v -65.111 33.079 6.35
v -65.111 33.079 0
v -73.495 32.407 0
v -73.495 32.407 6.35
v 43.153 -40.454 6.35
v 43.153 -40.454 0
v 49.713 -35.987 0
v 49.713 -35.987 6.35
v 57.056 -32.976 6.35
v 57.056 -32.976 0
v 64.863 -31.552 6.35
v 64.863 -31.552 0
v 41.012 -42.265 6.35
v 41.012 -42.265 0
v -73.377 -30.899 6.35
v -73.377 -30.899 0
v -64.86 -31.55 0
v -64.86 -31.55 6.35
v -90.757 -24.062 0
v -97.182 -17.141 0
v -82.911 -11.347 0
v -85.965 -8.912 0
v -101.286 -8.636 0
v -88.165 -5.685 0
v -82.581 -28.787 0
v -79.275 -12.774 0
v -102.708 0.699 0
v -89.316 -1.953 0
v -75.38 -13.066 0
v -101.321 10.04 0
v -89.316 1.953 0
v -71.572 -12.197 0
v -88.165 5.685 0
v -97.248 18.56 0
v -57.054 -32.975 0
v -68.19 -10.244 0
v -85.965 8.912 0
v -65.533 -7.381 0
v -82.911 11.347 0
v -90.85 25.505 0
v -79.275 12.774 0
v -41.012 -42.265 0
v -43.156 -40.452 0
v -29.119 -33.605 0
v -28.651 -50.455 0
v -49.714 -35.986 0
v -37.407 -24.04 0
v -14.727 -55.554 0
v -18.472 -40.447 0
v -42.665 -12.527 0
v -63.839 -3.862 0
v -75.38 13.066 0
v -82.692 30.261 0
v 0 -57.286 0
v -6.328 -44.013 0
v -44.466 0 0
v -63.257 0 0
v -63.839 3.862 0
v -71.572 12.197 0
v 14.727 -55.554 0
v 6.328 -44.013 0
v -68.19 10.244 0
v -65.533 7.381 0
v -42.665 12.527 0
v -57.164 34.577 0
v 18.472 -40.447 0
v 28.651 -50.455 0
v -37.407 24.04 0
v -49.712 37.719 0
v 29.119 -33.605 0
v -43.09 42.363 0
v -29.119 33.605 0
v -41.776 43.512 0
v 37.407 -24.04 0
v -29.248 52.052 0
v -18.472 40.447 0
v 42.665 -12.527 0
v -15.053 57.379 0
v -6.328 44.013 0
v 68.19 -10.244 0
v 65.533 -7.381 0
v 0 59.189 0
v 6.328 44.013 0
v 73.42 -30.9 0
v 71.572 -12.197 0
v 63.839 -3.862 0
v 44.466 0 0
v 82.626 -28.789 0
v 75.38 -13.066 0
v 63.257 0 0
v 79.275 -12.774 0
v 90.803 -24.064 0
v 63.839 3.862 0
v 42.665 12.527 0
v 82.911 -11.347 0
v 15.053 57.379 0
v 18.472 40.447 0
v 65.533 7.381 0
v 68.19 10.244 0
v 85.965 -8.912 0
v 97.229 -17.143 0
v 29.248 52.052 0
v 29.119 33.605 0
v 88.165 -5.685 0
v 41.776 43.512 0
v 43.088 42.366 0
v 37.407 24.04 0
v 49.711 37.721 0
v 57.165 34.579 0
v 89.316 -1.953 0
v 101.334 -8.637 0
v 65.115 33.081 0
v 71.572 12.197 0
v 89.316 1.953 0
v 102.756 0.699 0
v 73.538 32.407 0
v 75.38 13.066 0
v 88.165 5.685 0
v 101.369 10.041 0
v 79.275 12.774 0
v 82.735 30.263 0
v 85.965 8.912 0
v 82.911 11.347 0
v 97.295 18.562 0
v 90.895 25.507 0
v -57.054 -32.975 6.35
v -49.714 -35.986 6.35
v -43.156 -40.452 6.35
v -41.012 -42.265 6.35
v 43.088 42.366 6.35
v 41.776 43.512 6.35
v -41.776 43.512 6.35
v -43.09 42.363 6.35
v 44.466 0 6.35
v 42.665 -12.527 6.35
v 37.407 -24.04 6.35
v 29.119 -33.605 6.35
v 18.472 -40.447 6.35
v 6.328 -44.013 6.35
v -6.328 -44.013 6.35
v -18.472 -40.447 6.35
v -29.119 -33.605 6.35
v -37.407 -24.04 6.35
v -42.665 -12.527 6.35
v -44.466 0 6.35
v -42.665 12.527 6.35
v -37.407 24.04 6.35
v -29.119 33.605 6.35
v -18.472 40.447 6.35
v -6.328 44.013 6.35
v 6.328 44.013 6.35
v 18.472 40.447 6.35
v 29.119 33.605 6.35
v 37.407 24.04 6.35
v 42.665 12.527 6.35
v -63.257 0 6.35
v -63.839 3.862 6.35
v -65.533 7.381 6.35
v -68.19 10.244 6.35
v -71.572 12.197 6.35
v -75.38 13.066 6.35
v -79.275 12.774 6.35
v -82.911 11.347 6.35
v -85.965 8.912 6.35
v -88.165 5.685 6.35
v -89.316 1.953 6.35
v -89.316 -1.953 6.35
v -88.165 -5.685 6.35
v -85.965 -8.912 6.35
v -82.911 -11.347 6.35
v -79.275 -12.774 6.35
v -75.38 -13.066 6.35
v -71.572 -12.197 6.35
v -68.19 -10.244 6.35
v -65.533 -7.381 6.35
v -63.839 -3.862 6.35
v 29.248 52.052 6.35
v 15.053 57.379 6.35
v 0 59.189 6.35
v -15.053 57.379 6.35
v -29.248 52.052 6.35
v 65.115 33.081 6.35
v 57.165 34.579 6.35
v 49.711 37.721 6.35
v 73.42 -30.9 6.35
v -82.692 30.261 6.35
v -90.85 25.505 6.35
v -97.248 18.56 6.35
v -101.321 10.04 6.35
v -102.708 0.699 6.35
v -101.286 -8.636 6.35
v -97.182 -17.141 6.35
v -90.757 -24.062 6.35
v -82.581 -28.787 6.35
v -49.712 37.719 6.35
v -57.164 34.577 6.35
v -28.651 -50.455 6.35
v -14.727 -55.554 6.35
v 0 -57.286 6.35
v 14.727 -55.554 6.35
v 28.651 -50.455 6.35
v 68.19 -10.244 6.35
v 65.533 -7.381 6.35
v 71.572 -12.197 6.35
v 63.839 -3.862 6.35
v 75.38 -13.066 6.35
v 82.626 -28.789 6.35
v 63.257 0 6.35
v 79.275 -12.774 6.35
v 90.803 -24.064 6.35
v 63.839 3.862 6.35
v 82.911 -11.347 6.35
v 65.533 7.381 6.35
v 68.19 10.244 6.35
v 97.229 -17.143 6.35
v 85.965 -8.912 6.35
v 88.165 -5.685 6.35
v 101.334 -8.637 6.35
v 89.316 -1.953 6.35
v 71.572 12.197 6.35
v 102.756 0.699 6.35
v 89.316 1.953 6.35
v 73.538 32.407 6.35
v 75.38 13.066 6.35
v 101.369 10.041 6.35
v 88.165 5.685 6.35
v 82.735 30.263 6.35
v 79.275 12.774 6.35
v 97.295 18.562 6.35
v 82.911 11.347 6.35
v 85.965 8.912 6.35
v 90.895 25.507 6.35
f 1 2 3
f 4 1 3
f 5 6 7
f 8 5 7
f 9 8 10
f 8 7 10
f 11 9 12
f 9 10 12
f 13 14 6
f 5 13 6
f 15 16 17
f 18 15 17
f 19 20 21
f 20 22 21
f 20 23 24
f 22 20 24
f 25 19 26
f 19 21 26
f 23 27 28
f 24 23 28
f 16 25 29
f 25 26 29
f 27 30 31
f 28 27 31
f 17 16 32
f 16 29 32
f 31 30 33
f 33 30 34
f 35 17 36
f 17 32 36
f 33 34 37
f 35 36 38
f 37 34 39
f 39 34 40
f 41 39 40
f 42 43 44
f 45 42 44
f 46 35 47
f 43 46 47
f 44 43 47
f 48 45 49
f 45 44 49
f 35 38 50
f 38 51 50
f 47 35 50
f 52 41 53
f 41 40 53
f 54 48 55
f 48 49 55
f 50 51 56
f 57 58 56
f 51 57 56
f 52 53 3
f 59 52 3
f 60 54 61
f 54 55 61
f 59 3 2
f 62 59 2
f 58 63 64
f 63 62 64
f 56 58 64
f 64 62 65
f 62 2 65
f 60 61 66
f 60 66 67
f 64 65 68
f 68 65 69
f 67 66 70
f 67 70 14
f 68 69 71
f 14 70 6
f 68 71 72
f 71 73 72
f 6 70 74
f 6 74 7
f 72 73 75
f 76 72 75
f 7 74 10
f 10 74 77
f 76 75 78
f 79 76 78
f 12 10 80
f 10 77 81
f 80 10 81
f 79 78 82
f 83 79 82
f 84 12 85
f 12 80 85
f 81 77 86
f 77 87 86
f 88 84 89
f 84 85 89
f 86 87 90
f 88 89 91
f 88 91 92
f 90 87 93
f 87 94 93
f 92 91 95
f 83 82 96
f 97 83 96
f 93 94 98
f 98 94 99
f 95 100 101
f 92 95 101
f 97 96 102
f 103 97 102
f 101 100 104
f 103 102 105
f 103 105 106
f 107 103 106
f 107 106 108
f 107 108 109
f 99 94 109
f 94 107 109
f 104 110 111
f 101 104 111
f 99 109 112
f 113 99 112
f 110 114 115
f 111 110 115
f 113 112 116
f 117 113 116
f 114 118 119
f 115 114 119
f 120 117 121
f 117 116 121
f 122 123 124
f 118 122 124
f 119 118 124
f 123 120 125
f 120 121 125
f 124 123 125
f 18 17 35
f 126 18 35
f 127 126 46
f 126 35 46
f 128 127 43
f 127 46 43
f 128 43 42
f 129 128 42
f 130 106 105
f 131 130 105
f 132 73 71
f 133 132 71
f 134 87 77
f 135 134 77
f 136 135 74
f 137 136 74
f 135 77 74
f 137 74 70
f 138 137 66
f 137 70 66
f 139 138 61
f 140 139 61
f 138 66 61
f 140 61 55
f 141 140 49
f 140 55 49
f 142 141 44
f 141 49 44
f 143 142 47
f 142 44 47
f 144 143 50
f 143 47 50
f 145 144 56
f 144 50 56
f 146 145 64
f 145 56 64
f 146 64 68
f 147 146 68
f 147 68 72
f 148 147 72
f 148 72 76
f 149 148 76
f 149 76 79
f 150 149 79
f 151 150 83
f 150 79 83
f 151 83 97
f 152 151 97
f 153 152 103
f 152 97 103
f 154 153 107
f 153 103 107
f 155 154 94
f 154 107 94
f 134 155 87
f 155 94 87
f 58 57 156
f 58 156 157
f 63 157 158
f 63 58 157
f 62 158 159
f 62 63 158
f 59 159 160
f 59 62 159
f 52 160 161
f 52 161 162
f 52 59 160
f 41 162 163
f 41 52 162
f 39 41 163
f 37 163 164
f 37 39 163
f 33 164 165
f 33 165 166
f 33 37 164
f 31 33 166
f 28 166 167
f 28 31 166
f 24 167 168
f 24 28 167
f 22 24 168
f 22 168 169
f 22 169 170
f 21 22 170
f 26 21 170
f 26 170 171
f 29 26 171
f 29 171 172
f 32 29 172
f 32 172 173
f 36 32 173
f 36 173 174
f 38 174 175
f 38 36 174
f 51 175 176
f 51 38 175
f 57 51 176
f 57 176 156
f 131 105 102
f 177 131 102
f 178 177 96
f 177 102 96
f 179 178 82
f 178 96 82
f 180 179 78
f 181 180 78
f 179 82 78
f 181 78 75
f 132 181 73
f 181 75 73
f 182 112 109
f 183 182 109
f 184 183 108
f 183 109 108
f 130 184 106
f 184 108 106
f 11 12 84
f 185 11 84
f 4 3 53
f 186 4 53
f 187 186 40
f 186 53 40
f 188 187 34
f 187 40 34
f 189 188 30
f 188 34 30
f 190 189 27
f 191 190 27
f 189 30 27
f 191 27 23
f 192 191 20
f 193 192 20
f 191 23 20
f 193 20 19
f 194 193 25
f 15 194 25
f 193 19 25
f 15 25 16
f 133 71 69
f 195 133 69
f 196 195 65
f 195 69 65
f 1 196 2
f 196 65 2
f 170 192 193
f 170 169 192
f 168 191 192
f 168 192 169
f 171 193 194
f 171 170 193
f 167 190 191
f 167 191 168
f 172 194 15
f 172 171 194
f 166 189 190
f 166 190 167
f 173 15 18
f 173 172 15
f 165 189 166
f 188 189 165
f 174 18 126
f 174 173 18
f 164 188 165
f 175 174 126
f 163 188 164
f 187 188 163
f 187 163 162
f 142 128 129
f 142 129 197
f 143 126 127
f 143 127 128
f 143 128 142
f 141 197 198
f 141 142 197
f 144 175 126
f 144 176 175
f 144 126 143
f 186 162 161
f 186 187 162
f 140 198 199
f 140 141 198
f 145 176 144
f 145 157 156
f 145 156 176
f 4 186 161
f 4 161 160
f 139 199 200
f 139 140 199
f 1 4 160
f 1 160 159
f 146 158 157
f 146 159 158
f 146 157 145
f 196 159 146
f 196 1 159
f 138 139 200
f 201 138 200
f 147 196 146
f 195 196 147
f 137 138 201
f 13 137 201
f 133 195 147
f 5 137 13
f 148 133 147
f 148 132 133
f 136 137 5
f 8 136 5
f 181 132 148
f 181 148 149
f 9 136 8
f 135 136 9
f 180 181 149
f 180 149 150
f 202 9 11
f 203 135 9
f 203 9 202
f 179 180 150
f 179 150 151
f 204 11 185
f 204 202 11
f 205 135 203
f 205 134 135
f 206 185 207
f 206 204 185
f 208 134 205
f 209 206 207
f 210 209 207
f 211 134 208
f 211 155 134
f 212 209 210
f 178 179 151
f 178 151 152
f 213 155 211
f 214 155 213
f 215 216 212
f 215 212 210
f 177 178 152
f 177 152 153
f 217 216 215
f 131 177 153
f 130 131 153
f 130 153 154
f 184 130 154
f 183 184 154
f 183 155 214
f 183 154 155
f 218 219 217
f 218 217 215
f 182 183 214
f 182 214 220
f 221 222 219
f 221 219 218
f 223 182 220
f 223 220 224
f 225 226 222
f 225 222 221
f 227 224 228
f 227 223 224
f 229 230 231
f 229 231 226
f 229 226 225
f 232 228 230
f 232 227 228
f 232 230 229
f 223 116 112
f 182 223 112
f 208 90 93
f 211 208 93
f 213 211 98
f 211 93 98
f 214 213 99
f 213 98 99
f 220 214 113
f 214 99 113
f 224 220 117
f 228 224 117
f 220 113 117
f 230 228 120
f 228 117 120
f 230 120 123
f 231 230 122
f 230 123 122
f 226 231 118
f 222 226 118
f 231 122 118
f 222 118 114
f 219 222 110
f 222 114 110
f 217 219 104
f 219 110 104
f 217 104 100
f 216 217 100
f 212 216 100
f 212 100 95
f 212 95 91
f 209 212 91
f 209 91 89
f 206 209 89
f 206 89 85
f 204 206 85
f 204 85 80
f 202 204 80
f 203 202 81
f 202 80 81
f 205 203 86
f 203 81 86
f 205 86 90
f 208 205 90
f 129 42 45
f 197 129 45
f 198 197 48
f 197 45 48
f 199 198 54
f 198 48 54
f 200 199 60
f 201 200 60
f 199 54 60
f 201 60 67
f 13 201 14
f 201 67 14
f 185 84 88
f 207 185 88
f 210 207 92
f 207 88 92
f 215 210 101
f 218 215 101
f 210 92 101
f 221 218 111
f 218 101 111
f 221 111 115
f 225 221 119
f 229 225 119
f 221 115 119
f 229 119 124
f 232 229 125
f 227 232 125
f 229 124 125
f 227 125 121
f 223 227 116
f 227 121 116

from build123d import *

# Parameters (mm, degrees)
F0_R     = 13.102935
F1_DEPTH = 6.35


with BuildPart() as f1:
    # F0 (on Top) → F1 (new body)
    with BuildSketch(Plane.XY):
        with BuildLine():
            Line((-65.111071, 33.079109), (-73.495406, 32.406889))
            ThreePointArc((-73.495406, 32.406889), (-102.707914, 0.699242), (-73.377358, -30.899239))
            Line((-73.377358, -30.899239), (-64.859611, -31.550194))
            ThreePointArc((-64.859611, -31.550194), (-53.305524, -34.288957), (-43.155709, -40.451666))
            Line((-43.155709, -40.451666), (-41.011948, -42.265209))
            ThreePointArc((-41.011948, -42.265209), (0, -57.285625), (41.011948, -42.265209))
            Line((41.011948, -42.265209), (43.152891, -40.45405))
            ThreePointArc((43.152891, -40.45405), (53.305798, -34.290073), (64.863456, -31.55207))
            Line((64.863456, -31.55207), (73.420082, -30.899652))
            ThreePointArc((73.420082, -30.899652), (102.756191, 0.699387), (73.537863, 32.407366))
            Line((73.537863, 32.407366), (65.115129, 33.081106))
            ThreePointArc((65.115129, 33.081106), (53.354307, 35.951298), (43.087573, 42.366053))
            Line((43.087573, 42.366053), (41.775827, 43.511932))
            ThreePointArc((41.775827, 43.511932), (0, 59.189026), (-41.775827, 43.511932))
            Line((-41.775827, 43.511932), (-43.090499, 42.363497))
            ThreePointArc((-43.090499, 42.363497), (-53.354005, 35.950102), (-65.111071, 33.079109))
        make_face()
        with Locations((-76.359481, 0)):
            Circle(F0_R, mode=Mode.SUBTRACT)
        with BuildLine():
            ThreePointArc((-44.465763, 0), (0, 44.465763), (44.465763, 0))
            ThreePointArc((44.465763, 0), (0, -44.465763), (-44.465763, 0))
        make_face(mode=Mode.SUBTRACT)
        with BuildLine():
            ThreePointArc((89.462416, 0), (76.359481, -13.102935), (63.256546, 0))
            ThreePointArc((63.256546, 0), (76.359481, 13.102935), (89.462416, 0))
        make_face(mode=Mode.SUBTRACT)
    extrude(amount=F1_DEPTH)


solid = f1.part
